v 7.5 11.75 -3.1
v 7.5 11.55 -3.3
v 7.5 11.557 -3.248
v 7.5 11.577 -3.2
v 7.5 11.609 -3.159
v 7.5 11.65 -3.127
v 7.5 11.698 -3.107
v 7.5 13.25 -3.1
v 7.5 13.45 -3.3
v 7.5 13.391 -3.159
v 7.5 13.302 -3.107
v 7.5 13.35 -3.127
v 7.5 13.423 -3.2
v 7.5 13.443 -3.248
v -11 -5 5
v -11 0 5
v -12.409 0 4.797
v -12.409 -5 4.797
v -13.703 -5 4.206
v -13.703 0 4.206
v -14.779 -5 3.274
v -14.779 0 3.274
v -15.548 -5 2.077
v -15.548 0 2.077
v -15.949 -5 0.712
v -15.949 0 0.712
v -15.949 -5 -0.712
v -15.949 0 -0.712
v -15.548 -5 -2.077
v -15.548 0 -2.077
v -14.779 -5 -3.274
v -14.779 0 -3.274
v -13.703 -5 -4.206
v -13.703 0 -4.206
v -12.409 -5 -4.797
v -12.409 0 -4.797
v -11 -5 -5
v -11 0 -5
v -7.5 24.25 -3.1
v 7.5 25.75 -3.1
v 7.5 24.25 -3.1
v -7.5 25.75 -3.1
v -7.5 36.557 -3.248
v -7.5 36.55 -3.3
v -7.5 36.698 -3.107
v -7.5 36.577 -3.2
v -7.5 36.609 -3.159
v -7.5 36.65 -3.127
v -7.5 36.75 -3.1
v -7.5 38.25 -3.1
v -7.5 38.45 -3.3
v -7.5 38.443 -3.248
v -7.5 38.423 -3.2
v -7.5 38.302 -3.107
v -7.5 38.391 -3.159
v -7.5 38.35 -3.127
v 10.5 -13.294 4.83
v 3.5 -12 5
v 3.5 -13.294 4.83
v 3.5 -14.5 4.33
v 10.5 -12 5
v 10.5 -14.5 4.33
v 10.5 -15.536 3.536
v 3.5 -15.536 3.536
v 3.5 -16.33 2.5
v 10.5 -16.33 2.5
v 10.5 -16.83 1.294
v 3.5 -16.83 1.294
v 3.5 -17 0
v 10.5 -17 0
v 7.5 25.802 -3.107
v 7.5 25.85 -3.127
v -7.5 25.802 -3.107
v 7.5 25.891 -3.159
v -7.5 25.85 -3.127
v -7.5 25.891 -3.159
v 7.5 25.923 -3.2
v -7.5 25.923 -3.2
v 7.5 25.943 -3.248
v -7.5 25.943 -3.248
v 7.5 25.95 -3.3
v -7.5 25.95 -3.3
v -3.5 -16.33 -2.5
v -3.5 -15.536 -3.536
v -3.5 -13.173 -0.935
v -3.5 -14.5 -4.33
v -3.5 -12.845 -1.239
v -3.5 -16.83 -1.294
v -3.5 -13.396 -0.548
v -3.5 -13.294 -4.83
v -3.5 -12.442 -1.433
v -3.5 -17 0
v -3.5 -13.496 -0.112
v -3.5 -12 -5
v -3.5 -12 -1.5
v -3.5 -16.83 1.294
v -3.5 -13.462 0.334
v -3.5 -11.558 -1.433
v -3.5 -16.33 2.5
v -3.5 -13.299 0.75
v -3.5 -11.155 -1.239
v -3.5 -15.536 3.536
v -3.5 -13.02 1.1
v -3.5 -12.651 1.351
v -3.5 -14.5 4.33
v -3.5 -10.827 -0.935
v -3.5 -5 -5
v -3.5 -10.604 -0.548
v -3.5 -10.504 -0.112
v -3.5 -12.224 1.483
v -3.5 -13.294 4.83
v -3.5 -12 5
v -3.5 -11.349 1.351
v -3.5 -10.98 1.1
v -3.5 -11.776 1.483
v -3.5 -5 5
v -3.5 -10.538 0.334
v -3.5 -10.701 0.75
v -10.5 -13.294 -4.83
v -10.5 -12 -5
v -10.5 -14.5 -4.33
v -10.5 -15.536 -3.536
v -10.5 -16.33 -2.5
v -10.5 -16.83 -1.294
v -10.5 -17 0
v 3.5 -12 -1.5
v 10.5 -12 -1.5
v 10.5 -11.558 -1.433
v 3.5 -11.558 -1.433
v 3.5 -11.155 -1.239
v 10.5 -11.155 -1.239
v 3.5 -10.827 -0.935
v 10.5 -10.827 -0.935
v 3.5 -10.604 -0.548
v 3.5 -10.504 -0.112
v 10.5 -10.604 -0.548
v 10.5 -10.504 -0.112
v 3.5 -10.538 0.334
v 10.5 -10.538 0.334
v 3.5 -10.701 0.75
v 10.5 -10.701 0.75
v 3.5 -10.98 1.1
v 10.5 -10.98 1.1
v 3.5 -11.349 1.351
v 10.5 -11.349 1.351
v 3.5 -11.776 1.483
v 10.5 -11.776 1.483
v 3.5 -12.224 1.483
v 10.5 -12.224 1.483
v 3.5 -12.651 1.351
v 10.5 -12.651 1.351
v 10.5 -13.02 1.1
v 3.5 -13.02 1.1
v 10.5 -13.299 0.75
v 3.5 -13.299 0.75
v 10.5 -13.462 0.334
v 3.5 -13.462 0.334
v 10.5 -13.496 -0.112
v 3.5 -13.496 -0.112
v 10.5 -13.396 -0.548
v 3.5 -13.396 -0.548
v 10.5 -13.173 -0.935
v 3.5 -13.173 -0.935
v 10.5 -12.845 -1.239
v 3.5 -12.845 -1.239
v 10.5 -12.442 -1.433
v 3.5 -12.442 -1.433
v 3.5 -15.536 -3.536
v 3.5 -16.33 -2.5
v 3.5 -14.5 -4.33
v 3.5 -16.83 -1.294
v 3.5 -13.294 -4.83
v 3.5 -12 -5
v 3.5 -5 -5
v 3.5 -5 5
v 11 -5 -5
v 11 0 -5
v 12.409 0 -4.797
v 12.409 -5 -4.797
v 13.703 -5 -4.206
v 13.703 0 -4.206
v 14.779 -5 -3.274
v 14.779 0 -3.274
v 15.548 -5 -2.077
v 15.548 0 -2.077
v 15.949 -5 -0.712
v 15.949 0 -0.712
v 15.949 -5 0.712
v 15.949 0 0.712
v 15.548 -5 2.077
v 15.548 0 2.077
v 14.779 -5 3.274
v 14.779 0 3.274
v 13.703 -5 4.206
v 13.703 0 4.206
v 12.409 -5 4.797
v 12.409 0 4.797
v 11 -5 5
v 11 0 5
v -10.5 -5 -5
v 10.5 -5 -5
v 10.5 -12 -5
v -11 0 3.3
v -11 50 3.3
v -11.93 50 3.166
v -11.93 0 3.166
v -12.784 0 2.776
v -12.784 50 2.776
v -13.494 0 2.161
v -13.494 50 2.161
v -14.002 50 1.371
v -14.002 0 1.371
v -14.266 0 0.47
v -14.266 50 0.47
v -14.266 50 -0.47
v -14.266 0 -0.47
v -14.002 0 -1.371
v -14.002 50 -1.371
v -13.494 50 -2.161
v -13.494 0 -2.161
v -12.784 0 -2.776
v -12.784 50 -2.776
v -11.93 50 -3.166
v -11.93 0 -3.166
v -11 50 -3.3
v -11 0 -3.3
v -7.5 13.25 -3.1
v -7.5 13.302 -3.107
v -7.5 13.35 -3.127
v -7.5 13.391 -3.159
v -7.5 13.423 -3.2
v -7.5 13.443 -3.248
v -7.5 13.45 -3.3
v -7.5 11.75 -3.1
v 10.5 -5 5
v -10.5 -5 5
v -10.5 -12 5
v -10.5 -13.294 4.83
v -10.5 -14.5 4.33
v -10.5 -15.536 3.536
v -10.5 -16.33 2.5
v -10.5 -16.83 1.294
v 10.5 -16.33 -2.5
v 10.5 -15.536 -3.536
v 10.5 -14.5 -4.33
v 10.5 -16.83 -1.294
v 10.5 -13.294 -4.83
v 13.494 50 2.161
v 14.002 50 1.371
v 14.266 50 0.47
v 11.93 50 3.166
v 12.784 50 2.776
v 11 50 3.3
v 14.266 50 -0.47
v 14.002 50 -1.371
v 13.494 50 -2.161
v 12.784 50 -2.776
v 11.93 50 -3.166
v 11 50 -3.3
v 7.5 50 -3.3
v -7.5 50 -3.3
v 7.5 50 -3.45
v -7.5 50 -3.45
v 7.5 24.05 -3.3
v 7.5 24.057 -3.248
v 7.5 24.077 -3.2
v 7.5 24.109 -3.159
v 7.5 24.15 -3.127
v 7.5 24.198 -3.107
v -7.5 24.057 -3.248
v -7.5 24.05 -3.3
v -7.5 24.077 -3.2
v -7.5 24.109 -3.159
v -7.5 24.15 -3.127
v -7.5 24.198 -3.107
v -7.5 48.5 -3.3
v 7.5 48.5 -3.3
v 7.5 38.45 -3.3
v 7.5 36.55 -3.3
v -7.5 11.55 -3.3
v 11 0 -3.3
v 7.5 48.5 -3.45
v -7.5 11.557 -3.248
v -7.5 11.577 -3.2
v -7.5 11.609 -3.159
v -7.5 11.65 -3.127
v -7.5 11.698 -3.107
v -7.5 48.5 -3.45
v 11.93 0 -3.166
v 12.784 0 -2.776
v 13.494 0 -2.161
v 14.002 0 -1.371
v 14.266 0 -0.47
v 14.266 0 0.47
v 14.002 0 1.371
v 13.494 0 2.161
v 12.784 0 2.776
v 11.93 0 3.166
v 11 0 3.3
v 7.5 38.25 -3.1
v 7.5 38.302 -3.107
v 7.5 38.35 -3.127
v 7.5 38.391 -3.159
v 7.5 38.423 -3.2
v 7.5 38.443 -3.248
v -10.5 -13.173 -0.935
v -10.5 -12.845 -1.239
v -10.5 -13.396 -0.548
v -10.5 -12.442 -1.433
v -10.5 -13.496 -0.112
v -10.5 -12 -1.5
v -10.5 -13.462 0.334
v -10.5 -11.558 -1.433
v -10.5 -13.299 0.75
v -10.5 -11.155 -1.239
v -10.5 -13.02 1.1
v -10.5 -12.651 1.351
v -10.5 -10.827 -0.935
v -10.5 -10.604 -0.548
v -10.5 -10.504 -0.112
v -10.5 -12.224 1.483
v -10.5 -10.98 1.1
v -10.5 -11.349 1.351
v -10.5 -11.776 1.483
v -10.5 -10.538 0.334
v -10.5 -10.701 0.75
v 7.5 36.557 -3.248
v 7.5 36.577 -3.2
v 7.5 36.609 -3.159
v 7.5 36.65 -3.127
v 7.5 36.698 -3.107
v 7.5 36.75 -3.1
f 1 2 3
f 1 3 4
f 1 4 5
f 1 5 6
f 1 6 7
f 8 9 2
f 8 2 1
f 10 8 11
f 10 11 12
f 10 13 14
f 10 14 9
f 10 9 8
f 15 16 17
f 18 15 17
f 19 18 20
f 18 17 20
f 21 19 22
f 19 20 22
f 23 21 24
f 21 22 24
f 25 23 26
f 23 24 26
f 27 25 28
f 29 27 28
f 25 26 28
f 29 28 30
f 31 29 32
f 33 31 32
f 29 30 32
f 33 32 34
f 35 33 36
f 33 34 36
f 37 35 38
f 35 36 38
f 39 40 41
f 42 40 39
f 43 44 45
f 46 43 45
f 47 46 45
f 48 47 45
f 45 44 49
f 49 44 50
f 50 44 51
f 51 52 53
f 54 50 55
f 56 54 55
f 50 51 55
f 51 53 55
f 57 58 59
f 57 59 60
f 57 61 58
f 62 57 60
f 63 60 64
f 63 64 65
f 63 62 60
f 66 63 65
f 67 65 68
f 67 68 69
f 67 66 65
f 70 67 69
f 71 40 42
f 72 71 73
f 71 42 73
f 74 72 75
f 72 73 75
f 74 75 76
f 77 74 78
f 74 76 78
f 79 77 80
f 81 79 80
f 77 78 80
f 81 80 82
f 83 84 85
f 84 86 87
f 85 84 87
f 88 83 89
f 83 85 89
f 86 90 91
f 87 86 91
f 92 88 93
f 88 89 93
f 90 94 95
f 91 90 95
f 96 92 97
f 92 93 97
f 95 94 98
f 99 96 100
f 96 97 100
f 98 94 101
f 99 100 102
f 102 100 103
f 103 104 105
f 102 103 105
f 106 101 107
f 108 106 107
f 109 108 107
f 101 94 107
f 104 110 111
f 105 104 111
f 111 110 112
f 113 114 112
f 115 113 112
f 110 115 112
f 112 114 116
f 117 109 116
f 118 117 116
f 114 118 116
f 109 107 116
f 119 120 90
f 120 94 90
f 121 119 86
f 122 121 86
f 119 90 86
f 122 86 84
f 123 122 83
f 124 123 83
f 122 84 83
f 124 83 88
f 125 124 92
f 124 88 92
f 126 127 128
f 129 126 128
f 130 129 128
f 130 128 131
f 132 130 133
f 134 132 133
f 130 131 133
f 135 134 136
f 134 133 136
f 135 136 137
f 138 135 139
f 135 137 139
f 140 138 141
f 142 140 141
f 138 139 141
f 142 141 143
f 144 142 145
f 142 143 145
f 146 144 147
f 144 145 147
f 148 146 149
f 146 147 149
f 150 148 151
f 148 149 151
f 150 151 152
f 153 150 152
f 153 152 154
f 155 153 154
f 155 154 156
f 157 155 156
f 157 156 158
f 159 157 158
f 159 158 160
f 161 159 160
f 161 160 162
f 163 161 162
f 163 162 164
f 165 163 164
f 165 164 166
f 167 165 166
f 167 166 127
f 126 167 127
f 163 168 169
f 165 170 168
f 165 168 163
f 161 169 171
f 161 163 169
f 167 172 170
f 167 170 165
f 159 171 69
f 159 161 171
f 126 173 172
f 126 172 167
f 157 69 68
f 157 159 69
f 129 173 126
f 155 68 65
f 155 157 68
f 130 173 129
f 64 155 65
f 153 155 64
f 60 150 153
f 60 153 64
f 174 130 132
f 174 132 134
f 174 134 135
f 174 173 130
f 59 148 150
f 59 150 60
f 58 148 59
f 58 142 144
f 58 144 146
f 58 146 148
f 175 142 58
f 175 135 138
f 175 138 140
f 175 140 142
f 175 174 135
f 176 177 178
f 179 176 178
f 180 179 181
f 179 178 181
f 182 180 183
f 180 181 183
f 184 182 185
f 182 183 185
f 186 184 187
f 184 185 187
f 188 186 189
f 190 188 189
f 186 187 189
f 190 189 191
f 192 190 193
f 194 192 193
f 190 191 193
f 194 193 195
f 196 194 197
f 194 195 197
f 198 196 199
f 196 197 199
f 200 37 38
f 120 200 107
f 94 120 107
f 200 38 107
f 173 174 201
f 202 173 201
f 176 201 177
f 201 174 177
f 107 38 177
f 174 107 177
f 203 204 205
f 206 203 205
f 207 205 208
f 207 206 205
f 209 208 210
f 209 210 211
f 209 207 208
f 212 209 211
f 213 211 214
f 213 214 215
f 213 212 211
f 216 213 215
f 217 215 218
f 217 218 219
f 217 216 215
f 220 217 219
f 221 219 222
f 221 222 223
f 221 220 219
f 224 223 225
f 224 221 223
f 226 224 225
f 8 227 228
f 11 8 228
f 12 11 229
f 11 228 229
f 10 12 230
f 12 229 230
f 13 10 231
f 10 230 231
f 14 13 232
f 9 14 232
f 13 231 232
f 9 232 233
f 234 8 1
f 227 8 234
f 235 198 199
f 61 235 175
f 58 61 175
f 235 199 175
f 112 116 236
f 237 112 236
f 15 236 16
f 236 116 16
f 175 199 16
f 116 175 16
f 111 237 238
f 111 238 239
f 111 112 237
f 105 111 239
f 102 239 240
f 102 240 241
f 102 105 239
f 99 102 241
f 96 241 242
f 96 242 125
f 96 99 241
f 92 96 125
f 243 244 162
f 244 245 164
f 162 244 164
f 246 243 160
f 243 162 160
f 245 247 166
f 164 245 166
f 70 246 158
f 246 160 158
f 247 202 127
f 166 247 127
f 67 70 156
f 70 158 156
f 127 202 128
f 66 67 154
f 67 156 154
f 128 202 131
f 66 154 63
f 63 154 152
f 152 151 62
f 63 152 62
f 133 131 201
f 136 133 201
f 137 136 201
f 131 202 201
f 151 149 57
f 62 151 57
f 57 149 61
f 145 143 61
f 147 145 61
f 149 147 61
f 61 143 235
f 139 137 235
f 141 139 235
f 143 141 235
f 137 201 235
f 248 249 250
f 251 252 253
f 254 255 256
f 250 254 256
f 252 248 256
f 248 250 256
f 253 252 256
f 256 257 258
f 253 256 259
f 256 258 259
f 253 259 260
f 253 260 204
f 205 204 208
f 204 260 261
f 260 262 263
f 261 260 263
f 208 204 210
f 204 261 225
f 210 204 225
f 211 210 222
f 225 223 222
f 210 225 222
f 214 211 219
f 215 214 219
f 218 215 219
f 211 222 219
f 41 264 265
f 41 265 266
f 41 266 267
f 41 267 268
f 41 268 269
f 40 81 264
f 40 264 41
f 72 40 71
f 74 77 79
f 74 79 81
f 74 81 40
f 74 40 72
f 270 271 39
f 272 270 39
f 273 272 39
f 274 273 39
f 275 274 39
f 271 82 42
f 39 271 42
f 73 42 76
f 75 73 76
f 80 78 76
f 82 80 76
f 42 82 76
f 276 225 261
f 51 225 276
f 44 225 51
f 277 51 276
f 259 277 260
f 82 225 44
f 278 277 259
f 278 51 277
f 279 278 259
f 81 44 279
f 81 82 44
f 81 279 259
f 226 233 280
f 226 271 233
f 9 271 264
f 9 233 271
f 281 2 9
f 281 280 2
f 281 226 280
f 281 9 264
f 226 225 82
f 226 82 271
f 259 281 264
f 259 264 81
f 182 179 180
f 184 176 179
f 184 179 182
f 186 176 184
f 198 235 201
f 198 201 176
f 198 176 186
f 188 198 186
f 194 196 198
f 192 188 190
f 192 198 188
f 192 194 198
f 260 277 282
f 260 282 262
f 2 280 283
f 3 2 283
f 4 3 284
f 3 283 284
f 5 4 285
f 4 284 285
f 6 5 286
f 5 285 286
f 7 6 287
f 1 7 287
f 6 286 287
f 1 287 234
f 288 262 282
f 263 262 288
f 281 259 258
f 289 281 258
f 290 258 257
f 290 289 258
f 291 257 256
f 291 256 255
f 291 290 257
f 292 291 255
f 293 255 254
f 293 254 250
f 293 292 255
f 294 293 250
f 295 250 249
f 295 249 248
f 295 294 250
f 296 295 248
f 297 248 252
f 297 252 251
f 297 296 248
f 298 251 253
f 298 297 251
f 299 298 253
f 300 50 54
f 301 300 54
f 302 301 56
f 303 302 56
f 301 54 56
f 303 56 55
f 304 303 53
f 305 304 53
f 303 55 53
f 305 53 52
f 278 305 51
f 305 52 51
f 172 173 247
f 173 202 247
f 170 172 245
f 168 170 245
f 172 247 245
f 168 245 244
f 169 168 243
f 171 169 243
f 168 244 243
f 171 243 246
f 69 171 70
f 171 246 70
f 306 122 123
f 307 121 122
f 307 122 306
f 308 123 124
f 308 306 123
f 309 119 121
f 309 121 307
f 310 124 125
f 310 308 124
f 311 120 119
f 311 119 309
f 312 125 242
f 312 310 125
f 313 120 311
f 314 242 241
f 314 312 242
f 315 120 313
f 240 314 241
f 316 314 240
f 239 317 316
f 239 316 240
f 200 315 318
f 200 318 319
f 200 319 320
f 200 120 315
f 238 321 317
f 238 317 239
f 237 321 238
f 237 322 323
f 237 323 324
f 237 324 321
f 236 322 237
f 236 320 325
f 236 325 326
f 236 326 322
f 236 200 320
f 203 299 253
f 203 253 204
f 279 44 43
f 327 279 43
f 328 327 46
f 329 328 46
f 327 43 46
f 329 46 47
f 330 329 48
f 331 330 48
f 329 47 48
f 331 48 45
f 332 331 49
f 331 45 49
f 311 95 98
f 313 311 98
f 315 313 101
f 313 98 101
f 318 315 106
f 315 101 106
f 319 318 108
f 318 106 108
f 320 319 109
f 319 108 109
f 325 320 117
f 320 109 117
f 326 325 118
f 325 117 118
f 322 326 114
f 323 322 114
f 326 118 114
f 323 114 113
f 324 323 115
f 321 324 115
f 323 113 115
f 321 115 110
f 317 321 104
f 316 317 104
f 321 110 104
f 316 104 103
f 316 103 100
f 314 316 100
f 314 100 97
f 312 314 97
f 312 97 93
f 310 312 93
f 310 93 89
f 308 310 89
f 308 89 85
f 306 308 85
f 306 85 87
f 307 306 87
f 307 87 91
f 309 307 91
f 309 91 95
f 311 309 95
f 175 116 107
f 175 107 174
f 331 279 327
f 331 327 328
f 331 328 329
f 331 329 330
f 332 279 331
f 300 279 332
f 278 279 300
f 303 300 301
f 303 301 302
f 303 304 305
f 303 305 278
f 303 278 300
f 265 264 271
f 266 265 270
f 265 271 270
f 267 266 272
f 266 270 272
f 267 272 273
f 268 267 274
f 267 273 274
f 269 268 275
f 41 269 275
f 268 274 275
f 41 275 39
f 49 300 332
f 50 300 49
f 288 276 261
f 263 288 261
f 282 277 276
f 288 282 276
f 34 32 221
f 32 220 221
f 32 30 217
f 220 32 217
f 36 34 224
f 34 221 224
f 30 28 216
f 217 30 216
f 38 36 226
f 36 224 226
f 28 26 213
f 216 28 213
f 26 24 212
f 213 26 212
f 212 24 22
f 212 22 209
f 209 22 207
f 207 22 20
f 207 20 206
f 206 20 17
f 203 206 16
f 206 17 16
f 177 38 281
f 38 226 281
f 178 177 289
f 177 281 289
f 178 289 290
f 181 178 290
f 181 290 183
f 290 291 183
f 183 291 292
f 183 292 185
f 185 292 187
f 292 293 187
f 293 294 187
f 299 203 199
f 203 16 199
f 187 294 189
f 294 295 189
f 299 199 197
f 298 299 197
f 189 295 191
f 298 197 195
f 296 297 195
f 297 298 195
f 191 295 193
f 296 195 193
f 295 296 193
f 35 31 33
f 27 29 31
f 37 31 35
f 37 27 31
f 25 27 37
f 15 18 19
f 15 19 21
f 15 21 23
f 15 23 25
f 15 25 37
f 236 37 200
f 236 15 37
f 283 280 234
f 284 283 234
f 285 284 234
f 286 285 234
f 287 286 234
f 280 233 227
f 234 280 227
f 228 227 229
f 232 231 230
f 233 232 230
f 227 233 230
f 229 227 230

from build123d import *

# Parameters (mm, degrees)
EXTRUDE_1_DEPTH     = 50
SKETCH_2_W          = 15
SKETCH_2_H          = 1.5
CUT_EXTRUDE_1_DEPTH = 0.2
SKETCH_5_W          = 15
SKETCH_5_H          = 1.5
EXTRUDE_2_DEPTH     = 0.15
EXTRUDE_4_DEPTH     = 5
SKETCH_9_W          = 7
SKETCH_9_H          = 10
EXTRUDE_5_DEPTH     = 12
FILLET_2_R          = 5
SKETCH_10_R         = 1.5
CUT_EXTRUDE_3_DEPTH = 57.808890149
CUT_EXTRUDE_4_DEPTH = 15


with BuildPart() as part:
    # 草图1 → 凸台-拉伸1 (new body)
    with BuildSketch(Plane(origin=(0, 0, 0), x_dir=(1, 0, 0), z_dir=(0, 1, 0))):
        with BuildLine():
            Line((-11, 3.3), (11, 3.3))
            ThreePointArc((11, 3.3), (14.3, 0), (11, -3.3))
            Line((11, -3.3), (-11, -3.3))
            ThreePointArc((-11, -3.3), (-14.3, 0), (-11, 3.3))
        make_face()
    extrude(amount=EXTRUDE_1_DEPTH)

    # 草图2 → 切除-拉伸1 (cut)
    with BuildSketch(Plane(origin=(0, 0, -3.3), x_dir=(-1, 0, 0), z_dir=(0, 0, -1))):
        with Locations((0, 37.5)):
            Rectangle(SKETCH_2_W, SKETCH_2_H)
        with Locations((0, 12.5)):
            Rectangle(SKETCH_2_W, SKETCH_2_H)
        with Locations((0, 25)):
            Rectangle(SKETCH_2_W, SKETCH_2_H)
    extrude(amount=-CUT_EXTRUDE_1_DEPTH, mode=Mode.SUBTRACT)

    # 草图5 → 凸台-拉伸2 (add)
    with BuildSketch(Plane(origin=(0, 0, -3.3), x_dir=(-1, 0, 0), z_dir=(0, 0, -1))):
        with Locations((0, 49.25)):
            Rectangle(SKETCH_5_W, SKETCH_5_H)
    extrude(amount=EXTRUDE_2_DEPTH)

    # 草图8 → 凸台-拉伸4 (add)
    with BuildSketch(Plane.XZ):
        with BuildLine():
            Line((-11, -5), (11, -5))
            ThreePointArc((11, -5), (16, 0), (11, 5))
            Line((11, 5), (-11, 5))
            ThreePointArc((-11, 5), (-16, 0), (-11, -5))
        make_face()
    extrude(amount=EXTRUDE_4_DEPTH)

    # 草图9 → 凸台-拉伸5 (add)
    with BuildSketch(Plane.XZ.offset(5)):
        with Locations((-7, 0)):
            Rectangle(SKETCH_9_W, SKETCH_9_H)
        with Locations((7, 0)):
            Rectangle(SKETCH_9_W, SKETCH_9_H)
    extrude(amount=EXTRUDE_5_DEPTH)

    # 圆角2
    fillet_2_edges = [part.edges().sort_by_distance(p)[0] for p in [
        (7, -17, 5),
        (7, -17, -5),
        (-7, -17, 5),
        (-7, -17, -5),
    ]]
    fillet(fillet_2_edges, radius=FILLET_2_R - 0.0001)  # a hair under: the kernel refuses the full size

    # 草图10 → 切除-拉伸3 (cut, through all)
    with BuildSketch(Plane(origin=(10.5, 0, 0), x_dir=(0, 0, -1), z_dir=(1, 0, 0))):
        with Locations((0, -12)):
            Circle(SKETCH_10_R)
    extrude(amount=-CUT_EXTRUDE_3_DEPTH, mode=Mode.SUBTRACT)

    # 草图11 → 切除-拉伸4 (cut)
    with BuildSketch(Plane(origin=(-7.5, 0, 0), x_dir=(0, 0, -1), z_dir=(1, 0, 0))):
        with BuildLine():
            Line((3.3, 38.45), (3.3, 38.25))
            Line((3.3, 38.25), (3.1, 38.25))
            ThreePointArc((3.1, 38.25), (3.158578644, 38.391421356), (3.3, 38.45))
        make_face()
        with BuildLine():
            Line((3.3, 36.75), (3.3, 36.55))
            ThreePointArc((3.3, 36.55), (3.158578644, 36.608578644), (3.1, 36.75))
            Line((3.1, 36.75), (3.3, 36.75))
        make_face()
        with BuildLine():
            Line((3.3, 25.95), (3.3, 25.75))
            Line((3.3, 25.75), (3.1, 25.75))
            ThreePointArc((3.1, 25.75), (3.158578644, 25.891421356), (3.3, 25.95))
        make_face()
        with BuildLine():
            Line((3.3, 13.45), (3.3, 13.25))
            Line((3.3, 13.25), (3.1, 13.25))
            ThreePointArc((3.1, 13.25), (3.158578644, 13.391421356), (3.3, 13.45))
        make_face()
        with BuildLine():
            Line((3.3, 24.25), (3.3, 24.05))
            ThreePointArc((3.3, 24.05), (3.158578644, 24.108578644), (3.1, 24.25))
            Line((3.1, 24.25), (3.3, 24.25))
        make_face()
        with BuildLine():
            Line((3.3, 11.75), (3.3, 11.55))
            ThreePointArc((3.3, 11.55), (3.158578644, 11.608578644), (3.1, 11.75))
            Line((3.1, 11.75), (3.3, 11.75))
        make_face()
    extrude(amount=CUT_EXTRUDE_4_DEPTH, mode=Mode.SUBTRACT)


solid = part.part
